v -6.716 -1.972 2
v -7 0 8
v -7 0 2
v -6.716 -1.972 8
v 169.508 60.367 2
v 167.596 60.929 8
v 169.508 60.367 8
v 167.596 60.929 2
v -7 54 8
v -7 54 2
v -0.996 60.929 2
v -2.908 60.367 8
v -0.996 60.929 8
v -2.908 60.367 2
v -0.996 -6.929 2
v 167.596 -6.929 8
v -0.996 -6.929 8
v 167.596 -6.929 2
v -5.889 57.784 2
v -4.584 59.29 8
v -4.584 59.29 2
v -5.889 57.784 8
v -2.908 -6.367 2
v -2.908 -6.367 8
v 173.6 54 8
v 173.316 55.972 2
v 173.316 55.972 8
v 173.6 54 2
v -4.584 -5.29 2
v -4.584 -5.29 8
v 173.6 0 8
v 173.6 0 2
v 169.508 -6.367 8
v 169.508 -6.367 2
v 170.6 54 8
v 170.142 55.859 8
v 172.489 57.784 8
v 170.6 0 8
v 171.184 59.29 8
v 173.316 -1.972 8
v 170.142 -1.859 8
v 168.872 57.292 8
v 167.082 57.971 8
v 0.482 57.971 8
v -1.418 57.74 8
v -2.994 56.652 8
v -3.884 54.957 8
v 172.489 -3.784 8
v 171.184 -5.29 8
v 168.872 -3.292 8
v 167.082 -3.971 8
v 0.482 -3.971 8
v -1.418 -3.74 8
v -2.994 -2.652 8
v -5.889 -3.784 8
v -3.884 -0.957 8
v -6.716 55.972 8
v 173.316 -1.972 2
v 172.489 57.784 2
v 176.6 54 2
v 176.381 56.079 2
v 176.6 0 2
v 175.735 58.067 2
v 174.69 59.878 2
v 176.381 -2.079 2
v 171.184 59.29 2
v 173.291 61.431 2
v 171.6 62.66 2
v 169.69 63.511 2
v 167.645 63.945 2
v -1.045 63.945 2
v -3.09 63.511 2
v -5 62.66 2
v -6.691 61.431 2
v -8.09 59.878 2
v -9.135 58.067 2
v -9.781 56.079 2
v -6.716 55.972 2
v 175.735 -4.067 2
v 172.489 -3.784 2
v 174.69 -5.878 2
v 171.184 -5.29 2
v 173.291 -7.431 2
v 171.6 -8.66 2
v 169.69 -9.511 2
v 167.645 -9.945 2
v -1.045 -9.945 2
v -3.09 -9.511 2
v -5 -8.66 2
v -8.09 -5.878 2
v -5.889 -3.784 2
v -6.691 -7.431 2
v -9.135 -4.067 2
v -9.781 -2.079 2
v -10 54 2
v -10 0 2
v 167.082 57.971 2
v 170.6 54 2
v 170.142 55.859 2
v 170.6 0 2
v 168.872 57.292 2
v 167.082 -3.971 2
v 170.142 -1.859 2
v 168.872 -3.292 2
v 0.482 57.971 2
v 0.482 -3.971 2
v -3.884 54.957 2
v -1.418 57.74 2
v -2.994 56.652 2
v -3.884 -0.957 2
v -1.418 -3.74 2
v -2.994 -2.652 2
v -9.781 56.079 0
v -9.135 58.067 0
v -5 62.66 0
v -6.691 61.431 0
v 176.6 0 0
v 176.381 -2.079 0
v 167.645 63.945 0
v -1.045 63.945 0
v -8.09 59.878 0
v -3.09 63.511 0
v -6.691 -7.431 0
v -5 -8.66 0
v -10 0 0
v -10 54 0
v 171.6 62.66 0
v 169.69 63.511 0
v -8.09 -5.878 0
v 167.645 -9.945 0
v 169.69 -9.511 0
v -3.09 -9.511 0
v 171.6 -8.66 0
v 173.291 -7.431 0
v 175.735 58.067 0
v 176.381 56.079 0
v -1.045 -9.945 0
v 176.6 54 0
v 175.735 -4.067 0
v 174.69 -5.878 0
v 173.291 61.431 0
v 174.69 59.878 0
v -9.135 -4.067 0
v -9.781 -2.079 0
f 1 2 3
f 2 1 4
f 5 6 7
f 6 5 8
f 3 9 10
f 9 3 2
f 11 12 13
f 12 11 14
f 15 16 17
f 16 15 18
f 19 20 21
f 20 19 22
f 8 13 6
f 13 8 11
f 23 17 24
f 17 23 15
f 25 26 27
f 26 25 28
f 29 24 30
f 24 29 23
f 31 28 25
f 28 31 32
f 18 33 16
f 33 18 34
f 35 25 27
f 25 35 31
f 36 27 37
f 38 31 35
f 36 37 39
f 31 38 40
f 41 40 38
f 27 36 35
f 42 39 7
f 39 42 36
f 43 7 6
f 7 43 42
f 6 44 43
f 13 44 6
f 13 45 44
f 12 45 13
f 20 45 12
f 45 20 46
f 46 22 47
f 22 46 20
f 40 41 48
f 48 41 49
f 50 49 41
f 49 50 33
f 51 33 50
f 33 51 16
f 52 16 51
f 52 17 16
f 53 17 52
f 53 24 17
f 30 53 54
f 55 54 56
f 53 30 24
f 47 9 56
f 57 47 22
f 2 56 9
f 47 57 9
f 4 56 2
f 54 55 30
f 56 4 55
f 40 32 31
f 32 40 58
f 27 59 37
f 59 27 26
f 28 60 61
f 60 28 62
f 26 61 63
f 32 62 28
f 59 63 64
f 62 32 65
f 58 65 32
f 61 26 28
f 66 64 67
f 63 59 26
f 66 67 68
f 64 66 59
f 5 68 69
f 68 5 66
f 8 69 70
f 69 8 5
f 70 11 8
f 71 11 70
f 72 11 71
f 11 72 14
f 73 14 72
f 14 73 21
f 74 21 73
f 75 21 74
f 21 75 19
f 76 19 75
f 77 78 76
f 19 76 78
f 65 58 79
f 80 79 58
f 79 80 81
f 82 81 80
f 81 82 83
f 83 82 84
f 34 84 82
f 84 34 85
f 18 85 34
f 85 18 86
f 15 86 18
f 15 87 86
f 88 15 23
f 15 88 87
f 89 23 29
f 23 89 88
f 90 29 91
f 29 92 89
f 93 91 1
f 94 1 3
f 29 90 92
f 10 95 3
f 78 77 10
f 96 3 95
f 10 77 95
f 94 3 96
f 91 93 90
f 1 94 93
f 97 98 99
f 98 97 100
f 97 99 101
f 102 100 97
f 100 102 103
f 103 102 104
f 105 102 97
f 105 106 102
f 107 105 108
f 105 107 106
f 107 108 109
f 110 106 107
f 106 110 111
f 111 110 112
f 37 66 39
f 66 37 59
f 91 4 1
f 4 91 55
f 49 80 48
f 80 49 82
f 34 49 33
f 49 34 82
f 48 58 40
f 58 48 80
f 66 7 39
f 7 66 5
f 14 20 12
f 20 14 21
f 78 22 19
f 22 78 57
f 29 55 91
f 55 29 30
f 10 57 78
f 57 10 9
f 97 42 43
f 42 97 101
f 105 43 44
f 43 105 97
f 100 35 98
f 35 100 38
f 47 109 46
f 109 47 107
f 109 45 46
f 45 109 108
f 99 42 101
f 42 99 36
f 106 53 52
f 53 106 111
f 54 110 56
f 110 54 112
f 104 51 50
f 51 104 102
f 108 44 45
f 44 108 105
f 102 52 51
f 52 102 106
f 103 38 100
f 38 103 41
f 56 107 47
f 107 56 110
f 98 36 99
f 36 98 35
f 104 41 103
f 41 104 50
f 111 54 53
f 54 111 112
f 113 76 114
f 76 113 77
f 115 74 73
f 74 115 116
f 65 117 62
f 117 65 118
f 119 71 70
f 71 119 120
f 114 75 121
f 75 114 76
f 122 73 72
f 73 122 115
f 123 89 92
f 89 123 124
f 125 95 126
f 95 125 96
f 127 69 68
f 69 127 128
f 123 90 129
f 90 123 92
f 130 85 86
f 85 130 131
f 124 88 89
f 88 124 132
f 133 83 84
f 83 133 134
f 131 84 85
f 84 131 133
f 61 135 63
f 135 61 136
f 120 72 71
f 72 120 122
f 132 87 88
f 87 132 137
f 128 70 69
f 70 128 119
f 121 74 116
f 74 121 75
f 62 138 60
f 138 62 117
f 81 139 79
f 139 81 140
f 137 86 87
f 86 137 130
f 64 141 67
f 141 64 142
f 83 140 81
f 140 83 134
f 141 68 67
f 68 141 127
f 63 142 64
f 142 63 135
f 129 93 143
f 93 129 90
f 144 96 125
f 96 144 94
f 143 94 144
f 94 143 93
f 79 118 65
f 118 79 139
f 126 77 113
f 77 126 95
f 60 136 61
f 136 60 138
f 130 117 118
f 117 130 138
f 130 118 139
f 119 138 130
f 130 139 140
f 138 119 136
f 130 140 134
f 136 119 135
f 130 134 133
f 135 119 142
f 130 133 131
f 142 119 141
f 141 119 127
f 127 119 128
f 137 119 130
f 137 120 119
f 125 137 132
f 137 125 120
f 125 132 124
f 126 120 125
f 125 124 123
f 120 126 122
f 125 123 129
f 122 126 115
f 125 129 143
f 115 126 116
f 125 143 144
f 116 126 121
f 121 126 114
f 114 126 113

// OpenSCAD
// file: BoxCommon.scad
// Sum array members:
function suma(array,start,end) =
    (start==end)
    ? array[start]
    : suma(array, start+1, end) + array[start];
function e(clear,o) =// Add clear to demensions of o
     (is_list(clear)) ?
        [o.x+clear.x,o.y+clear.y,o.z+clear.z] :
        [o.x+clear,o.y+clear,o.z+clear];

function align(mode,here,center=true)=
    [ search(mode,"eErR")?here.x:(search(mode,"wWlL")?0:here.x/2),
    search(mode,"nN")?here.y:(search(mode,"sS")?0:here.y/2),
    search(mode,"tT")?here.z:(search(mode,"bB")?0:here.z/2)]-
    (center?[here.x/2,here.y/2, here.z/2]:[0,0,0]);


module cubeXY(cc)
{
    translate([-cc.x/2,-cc.y/2, 0]) cube(cc,center=false);
}
 
DISPBLOCK=[16+50.2*3,44,4]; // Z is arbitrary at the moment

// FF=Fudge Factor

DMM_BOARD_X=66 ; // 63 NO FF FROM DRAWING
DMM_BOARD_Y=2 ; // 1.6 NO FF Measured
//DMM_Center=[50,-20,0];

// Extra board locations relative to the DMM board:
CPU_Board_Loc=[0,26,6];
IF_Board_Loc=[0,14,6];
boards=[[0,0,0],IF_Board_Loc,CPU_Board_Loc];


S_VO_OFFS=-19.08; // From drawing
S_Widths=14; // FROM Drawing
// Places 5A jack at edge of board.:
S_FUDGE=DMM_BOARD_X/2-S_Widths*2-2; 
S1=-S_Widths/2+S_FUDGE;
S0=S_VO_OFFS+S1;
S2=S_Widths/2+S_FUDGE; 
S3=S2+S_Widths;
DMM_JAX_X=[S0,S1,S2,S3];

// STack up to C/L of jack in Y - Measured terms
DMM_JAX_Y=DMM_BOARD_Y/2+4.9+5.5/2; 
DMM_JAX_LOWER_DIA=12; // Measured
DMM_JAX_UPPER_DIA=15; // Same as S_Widths
DMM_JAX_Z_OFFS=3.3 ; // How much of the lower shoulder shows.

for (i=[DMM_JAX_X])
    echo(i);
echo(DMM_JAX_Y);
// main file
include <BoxCommon.scad>
innerPanel=[DISPBLOCK.x,DISPBLOCK.y+10,1];


minkowski()
{
    cube(innerPanel,center=false);
    cylinder(r=10,h=1);
}

translate([0,0,2])
{
    difference()
    {
        minkowski()
        {
            cube(innerPanel,center=false);
            cylinder(r=7,h=5);
        }
        minkowski()
        {
            cube(innerPanel,center=false);
            cylinder(r=4,h=5.5);
        }
    }
};
